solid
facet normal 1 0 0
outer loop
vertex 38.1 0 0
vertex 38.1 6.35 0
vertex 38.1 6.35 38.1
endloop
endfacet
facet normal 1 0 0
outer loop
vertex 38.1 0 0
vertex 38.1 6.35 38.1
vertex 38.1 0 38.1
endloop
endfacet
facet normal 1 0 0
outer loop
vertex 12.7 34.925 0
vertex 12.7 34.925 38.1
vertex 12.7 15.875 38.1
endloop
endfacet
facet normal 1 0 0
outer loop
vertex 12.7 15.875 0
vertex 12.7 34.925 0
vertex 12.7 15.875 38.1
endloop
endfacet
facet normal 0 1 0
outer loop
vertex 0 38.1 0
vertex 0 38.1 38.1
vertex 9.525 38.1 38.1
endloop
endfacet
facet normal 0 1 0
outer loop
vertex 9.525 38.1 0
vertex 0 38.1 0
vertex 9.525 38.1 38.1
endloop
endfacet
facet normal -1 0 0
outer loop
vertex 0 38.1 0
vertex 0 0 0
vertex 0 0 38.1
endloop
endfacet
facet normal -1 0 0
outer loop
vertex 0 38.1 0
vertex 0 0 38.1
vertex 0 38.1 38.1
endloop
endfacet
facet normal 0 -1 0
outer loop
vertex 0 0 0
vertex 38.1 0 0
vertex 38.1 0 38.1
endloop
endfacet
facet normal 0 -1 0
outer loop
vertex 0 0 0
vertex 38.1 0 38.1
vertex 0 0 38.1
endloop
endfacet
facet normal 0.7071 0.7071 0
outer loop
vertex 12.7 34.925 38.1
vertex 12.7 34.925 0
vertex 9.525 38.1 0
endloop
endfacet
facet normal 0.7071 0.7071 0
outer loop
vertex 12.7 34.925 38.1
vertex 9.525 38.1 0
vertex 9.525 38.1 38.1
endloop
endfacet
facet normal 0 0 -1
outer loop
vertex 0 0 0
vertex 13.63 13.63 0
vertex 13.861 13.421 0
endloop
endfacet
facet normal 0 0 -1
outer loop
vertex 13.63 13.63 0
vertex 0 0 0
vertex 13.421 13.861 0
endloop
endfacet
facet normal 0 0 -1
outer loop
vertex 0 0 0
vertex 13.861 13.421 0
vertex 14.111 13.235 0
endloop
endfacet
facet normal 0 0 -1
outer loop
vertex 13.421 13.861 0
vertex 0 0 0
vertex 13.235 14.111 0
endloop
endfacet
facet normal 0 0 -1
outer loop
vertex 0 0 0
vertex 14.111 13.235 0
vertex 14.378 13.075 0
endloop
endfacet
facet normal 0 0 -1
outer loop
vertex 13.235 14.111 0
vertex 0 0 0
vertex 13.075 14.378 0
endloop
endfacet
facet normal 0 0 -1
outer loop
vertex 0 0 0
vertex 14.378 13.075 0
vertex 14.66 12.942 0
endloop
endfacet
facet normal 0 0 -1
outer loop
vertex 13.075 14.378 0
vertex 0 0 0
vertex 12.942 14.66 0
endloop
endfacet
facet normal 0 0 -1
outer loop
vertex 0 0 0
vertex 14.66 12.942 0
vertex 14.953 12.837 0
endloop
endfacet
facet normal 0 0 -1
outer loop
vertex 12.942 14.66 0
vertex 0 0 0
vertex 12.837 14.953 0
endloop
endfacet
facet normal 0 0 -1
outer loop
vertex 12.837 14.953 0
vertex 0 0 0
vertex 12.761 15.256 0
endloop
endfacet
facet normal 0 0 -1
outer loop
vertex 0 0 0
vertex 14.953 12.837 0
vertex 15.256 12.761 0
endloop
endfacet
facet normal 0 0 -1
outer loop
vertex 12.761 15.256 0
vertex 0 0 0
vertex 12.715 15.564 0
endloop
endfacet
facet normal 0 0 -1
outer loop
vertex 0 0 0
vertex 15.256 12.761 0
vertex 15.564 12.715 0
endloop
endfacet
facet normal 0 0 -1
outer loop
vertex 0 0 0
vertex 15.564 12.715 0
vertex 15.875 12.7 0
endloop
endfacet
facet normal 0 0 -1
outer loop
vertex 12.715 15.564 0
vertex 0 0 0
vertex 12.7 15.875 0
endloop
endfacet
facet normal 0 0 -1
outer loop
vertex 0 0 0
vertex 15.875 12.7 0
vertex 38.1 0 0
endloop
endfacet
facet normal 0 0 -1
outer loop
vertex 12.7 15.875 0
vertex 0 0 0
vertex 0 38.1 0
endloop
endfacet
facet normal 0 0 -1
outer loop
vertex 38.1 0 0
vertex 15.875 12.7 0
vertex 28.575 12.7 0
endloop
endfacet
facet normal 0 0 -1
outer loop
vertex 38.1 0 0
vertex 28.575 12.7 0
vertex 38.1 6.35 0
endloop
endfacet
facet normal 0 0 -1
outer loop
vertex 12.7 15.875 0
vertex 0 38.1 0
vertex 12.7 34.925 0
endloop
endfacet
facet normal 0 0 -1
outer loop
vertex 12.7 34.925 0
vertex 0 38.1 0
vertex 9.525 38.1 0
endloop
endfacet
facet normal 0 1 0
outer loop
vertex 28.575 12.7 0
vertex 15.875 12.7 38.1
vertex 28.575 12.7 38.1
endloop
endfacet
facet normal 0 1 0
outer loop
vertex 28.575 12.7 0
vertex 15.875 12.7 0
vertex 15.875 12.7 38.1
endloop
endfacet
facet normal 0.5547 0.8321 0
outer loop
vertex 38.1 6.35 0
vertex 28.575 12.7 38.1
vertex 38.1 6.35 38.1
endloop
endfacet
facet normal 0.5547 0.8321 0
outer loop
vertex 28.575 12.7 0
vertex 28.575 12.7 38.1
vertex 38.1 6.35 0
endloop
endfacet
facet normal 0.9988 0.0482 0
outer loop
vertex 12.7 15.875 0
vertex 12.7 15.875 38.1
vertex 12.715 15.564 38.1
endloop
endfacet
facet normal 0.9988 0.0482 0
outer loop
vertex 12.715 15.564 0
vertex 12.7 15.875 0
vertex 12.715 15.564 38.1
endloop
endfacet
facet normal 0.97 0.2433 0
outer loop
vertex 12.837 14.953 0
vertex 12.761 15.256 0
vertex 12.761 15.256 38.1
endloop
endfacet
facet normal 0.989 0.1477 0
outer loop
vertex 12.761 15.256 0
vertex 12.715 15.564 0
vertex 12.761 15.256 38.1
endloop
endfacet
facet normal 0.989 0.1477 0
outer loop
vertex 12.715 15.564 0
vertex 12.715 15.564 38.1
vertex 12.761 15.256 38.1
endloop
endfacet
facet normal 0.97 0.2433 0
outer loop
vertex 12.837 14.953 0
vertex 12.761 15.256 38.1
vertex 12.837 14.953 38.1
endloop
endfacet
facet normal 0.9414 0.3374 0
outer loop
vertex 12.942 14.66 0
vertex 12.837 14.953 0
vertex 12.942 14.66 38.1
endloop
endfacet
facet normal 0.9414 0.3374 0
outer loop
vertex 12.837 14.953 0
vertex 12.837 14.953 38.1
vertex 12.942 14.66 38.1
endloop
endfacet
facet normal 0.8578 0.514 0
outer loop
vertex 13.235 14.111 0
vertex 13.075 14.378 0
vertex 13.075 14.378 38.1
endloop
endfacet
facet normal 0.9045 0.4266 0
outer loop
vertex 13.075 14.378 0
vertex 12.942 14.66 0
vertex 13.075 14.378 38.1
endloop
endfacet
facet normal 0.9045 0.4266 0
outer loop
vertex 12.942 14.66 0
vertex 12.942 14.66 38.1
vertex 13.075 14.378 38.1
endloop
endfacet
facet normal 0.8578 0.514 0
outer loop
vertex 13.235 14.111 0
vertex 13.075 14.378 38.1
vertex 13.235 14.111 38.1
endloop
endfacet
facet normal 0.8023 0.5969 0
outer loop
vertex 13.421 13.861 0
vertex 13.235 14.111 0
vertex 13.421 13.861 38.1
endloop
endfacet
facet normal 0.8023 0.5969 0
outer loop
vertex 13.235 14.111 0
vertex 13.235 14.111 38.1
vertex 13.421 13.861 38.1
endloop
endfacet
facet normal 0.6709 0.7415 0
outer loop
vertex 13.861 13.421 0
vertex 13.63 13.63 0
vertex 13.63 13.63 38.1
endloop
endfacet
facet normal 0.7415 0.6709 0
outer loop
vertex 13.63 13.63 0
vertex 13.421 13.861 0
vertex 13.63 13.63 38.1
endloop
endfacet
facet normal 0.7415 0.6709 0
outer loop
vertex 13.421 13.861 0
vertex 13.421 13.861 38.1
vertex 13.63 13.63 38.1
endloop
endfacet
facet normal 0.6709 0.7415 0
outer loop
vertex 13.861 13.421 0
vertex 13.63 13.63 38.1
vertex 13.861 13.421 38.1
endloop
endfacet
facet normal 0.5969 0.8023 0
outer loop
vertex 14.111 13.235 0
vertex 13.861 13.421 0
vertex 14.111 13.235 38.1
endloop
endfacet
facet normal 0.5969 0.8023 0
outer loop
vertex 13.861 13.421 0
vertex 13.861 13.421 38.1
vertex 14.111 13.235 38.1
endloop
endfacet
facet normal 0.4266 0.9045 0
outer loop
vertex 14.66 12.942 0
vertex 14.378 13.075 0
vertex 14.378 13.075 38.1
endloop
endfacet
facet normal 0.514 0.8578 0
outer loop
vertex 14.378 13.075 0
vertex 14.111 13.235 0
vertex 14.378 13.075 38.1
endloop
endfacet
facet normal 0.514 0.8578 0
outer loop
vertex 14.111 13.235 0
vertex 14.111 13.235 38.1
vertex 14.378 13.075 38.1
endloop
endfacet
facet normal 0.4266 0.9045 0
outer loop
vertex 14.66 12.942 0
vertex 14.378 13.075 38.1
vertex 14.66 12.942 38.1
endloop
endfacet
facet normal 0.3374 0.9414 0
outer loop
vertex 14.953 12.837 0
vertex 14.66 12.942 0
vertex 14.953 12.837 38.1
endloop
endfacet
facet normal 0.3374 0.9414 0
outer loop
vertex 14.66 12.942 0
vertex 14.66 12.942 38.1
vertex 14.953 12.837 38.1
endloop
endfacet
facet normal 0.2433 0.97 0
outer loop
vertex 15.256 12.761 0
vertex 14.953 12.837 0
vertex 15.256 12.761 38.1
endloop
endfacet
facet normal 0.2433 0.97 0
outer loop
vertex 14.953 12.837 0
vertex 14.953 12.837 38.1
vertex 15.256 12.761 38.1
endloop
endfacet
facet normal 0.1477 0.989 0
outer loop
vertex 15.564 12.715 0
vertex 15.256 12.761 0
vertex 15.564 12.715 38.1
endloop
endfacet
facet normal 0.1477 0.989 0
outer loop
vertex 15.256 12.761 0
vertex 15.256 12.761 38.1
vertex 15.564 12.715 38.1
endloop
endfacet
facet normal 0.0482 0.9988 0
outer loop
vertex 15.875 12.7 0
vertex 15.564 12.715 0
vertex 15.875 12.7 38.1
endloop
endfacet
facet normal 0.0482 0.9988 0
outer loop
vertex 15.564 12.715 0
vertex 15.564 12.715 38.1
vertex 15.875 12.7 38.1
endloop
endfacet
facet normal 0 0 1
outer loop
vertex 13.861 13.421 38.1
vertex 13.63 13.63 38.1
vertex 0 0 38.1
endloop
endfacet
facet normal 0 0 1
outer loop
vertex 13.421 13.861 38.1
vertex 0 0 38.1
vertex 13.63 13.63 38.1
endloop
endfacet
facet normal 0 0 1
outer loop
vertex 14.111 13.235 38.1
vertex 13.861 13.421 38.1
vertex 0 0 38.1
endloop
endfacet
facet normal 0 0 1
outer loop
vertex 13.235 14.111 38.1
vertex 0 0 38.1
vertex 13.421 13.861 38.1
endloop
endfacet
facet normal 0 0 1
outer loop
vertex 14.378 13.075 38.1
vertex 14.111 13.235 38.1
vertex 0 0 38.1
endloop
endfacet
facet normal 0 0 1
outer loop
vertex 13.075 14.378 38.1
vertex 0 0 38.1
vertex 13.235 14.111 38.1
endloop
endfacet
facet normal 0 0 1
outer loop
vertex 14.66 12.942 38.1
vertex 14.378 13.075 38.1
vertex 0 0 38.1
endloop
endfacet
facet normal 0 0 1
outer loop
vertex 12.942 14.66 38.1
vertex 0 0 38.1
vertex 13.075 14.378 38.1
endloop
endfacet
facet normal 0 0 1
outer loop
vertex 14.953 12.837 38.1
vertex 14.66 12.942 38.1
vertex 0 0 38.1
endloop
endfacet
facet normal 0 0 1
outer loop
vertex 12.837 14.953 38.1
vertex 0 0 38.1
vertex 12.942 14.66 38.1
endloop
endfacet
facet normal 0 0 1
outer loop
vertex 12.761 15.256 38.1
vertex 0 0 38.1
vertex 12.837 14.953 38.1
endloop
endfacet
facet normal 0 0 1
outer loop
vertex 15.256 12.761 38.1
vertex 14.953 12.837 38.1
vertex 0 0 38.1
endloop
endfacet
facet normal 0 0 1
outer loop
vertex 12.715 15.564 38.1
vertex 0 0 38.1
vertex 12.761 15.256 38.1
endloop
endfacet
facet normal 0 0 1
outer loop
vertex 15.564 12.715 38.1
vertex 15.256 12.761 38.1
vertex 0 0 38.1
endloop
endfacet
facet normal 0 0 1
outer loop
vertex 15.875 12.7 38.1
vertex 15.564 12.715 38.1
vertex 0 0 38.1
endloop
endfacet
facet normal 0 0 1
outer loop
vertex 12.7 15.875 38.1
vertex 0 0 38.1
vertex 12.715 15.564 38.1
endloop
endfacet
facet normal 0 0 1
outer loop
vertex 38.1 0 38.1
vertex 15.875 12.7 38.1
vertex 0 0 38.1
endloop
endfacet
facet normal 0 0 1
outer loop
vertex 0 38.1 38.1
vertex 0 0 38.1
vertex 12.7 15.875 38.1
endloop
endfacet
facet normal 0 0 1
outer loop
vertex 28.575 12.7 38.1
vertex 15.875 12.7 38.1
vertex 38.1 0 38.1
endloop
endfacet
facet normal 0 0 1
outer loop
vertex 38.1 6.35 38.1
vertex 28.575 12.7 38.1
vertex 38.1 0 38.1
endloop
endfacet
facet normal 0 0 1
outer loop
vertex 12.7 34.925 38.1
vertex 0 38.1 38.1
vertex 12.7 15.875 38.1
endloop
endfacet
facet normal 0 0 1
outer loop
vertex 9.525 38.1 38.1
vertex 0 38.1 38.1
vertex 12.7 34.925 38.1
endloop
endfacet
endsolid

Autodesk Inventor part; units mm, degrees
ref_plane "YZ Plane" through (0, 0, 0) normal (1, 0, 0) x (0, 1, 0)
ref_plane "XZ Plane" through (0, 0, 0) normal (0, 1, 0) x (-1, 0, 0)
ref_plane "XY Plane" through (0, 0, 0) normal (0, 0, 1) x (1, 0, 0)
sketch "Sketch1" plane through (0, 0, 0) normal (0, 0, 1) x (1, 0, 0)
  line L0 (0, 0) -> (0, 38.1)
  line L1 (0, 38.1) -> (12.7, 38.1)
  line L2 (12.7, 38.1) -> (12.7, 12.7)
  line L3 (12.7, 12.7) -> (38.1, 12.7)
  line L4 (38.1, 12.7) -> (38.1, 0)
  line L5 (38.1, 0) -> (0, 0)
  dimension "d0" = 38.1
  dimension "d1" = 12.7
  dimension "d2" = 25.4
  dimension "d3" = 25.4
  dimension "d4" = 12.7
extrude "Extrusion1" add sketch "Sketch1" along normal blind 38.1
chamfer "Chamfer1" distance 3.175 angle 45 1 edges at (12.7, 38.1, 19.05)
chamfer "Chamfer2" distance 6.35 distance2 9.525 1 edges at (38.1, 12.7, 19.05) measured on face at (38.1, 4.2333, 12.7)
fillet "Fillet2" radius 3.175 1 edges at (12.7, 12.7, 19.05)
properties part number "Practice 6"
